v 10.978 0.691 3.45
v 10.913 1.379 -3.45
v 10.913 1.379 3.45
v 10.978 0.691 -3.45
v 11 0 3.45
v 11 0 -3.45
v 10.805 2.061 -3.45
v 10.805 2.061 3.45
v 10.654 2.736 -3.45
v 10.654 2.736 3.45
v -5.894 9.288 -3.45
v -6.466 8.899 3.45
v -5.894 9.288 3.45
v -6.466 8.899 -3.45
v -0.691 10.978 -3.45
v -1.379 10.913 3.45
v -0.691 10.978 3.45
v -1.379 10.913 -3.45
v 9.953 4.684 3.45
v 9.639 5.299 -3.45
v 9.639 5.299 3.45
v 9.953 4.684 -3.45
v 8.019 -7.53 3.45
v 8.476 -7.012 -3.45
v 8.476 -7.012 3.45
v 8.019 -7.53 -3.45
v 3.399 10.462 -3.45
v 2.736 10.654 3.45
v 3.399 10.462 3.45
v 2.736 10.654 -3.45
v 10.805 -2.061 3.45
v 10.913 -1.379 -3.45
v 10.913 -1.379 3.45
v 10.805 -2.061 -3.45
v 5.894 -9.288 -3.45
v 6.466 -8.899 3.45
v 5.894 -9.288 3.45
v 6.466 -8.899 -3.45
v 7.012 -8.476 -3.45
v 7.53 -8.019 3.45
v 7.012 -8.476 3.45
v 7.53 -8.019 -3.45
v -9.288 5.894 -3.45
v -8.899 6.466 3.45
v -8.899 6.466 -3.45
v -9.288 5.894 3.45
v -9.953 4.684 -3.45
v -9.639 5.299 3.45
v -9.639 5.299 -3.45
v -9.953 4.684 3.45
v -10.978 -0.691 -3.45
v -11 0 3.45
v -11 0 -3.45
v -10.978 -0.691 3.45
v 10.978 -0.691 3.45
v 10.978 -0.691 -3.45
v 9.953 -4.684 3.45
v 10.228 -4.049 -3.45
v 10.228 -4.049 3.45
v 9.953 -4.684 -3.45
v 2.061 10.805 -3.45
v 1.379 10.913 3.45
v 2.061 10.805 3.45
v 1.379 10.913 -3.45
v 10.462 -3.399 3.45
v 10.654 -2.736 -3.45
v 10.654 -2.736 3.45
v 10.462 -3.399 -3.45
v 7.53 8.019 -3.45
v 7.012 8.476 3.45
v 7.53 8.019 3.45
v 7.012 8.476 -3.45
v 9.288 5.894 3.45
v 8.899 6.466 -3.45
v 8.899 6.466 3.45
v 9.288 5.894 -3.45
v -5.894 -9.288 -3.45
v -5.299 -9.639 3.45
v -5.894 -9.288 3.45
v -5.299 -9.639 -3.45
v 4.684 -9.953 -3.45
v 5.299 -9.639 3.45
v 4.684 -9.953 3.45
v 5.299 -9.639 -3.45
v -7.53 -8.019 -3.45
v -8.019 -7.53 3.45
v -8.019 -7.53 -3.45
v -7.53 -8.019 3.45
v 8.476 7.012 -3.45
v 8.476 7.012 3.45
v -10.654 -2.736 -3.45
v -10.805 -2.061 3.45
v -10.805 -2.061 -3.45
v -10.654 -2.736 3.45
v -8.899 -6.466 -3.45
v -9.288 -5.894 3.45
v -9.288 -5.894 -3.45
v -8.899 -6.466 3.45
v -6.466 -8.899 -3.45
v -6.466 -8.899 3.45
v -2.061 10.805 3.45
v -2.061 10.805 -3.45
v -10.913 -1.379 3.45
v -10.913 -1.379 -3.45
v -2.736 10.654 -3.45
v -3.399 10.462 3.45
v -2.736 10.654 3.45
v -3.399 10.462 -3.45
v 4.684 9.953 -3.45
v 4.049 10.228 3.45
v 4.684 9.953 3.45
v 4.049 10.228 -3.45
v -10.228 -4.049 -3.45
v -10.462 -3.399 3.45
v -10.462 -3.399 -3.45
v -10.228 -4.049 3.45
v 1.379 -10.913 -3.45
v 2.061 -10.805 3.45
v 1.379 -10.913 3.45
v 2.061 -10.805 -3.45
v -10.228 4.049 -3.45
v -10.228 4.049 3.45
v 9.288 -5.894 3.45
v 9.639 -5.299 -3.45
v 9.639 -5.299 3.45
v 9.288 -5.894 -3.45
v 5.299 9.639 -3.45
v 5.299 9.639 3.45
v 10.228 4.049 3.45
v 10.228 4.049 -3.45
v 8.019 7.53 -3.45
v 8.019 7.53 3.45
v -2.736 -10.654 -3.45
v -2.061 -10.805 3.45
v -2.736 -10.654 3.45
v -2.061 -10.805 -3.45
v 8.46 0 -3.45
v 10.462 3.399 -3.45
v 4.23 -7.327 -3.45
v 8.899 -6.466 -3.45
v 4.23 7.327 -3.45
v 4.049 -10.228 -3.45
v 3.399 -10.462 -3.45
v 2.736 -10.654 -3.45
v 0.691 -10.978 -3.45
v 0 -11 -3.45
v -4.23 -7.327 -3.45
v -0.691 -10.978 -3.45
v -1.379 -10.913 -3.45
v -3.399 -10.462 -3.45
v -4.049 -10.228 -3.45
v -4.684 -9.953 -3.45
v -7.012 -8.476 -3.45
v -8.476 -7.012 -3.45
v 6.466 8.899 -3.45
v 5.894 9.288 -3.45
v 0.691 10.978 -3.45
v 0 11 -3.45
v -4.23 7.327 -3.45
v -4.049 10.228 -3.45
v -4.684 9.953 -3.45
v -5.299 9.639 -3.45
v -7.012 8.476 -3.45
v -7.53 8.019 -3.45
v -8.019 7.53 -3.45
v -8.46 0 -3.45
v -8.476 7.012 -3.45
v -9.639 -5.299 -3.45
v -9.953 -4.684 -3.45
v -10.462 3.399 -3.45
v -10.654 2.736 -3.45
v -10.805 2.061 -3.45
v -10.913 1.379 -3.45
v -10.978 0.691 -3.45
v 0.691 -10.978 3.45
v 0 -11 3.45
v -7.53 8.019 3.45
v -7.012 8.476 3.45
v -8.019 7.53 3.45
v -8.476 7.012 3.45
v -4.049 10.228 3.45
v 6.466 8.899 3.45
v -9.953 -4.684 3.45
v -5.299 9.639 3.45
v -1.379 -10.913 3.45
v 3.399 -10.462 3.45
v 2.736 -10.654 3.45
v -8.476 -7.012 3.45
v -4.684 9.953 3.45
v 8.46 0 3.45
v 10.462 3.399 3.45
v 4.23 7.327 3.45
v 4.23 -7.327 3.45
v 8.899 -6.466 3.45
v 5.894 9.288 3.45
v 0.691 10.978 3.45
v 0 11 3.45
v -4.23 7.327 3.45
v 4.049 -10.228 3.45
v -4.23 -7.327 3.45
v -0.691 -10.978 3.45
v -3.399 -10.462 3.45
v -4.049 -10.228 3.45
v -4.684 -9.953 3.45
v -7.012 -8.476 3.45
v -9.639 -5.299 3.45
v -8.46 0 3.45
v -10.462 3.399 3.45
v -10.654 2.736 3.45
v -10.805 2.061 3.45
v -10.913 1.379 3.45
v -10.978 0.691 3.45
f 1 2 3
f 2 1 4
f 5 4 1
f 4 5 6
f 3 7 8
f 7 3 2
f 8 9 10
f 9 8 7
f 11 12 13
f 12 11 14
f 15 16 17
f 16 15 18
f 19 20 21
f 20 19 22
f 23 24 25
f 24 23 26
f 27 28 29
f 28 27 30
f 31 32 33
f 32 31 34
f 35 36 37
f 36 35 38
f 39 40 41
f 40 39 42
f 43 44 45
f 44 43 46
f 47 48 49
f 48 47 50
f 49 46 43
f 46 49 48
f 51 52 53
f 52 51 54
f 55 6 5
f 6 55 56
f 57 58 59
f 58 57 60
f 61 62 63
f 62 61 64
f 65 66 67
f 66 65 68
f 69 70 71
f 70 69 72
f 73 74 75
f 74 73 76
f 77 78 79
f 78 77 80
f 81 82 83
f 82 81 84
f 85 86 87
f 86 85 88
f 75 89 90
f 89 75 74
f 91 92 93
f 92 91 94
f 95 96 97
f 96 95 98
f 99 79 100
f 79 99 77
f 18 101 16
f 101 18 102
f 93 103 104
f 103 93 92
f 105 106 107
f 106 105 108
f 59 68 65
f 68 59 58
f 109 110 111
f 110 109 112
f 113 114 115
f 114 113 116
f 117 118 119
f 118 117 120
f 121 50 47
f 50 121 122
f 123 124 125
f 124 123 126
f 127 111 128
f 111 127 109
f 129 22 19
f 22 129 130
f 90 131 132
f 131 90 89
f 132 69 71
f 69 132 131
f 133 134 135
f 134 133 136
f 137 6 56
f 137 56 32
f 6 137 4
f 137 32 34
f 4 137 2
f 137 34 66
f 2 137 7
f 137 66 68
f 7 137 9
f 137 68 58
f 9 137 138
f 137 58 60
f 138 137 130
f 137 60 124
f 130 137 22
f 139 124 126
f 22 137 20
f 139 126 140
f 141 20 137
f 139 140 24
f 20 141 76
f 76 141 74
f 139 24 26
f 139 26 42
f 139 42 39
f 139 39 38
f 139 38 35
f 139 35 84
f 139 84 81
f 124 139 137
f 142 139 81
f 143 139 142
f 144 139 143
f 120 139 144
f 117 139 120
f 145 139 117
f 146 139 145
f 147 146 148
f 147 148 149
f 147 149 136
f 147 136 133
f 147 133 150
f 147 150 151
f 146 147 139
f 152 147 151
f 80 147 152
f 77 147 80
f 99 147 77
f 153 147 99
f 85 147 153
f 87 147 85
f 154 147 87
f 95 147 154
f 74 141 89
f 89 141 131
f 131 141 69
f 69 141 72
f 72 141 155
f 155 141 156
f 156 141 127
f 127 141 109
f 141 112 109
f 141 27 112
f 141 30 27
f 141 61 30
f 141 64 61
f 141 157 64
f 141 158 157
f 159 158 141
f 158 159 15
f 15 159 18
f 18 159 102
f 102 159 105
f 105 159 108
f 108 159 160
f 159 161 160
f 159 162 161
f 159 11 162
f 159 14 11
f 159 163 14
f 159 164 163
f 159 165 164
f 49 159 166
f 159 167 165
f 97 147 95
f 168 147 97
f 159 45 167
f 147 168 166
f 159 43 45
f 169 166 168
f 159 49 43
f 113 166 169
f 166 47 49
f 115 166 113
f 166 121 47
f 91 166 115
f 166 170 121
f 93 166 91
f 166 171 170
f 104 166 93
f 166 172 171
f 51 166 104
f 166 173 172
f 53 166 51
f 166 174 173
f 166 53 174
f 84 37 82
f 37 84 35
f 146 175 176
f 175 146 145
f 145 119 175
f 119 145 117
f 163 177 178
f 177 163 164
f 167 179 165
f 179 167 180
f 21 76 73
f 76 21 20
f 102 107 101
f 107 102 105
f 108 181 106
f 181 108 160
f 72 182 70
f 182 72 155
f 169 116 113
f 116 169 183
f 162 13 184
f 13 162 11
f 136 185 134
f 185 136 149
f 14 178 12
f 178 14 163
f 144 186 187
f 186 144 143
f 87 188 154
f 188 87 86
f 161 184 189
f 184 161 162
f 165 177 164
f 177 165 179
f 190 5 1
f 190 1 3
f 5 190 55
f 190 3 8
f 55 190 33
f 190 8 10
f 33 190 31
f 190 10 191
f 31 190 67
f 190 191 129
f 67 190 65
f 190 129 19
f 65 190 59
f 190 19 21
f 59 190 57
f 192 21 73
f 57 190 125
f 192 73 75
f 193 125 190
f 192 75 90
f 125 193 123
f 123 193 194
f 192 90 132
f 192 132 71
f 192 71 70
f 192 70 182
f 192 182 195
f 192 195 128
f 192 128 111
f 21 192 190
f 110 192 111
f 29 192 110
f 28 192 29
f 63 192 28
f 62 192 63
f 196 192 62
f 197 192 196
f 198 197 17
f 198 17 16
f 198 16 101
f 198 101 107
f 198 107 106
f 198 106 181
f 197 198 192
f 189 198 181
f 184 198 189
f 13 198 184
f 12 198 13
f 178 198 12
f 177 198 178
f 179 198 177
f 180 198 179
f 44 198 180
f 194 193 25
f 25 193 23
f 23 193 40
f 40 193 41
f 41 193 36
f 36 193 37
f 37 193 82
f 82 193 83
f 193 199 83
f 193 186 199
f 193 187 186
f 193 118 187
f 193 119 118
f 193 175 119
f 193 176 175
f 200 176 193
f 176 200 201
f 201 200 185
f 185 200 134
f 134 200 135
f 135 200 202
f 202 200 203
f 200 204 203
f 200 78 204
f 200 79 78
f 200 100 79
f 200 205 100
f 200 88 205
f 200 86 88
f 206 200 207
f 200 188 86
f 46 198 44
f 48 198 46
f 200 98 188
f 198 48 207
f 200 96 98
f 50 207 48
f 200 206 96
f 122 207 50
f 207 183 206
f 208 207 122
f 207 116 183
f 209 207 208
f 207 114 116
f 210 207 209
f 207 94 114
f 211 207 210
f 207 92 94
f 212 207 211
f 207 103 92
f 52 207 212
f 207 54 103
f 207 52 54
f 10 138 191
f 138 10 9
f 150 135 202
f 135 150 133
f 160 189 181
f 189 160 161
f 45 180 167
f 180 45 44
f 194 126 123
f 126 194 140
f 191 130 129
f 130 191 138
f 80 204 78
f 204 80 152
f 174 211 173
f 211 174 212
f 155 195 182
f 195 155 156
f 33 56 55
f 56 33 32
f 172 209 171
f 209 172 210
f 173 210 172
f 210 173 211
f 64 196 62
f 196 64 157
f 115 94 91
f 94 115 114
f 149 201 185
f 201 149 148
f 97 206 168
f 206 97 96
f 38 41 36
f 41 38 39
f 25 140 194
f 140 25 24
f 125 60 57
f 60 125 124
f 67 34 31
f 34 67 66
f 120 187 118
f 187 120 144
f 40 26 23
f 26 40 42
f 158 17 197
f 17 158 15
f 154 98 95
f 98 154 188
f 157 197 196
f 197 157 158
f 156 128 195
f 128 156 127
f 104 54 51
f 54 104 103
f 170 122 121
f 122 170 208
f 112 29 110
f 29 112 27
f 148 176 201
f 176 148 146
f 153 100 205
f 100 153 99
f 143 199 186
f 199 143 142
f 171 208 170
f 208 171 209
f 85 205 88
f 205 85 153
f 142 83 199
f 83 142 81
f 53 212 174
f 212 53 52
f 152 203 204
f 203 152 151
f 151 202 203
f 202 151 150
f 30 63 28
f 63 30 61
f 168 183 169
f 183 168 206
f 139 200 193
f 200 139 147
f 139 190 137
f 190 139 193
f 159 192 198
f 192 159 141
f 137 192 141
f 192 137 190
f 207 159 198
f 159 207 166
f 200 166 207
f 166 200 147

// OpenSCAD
//--------------------------------------------------------
// Customizer settings and variable defs

// preview[view:south east, tilt:top diagonal]

/* [Dimensions] */
// Thickness of bearing replacement(mm)
Height = 6.9;
// Replacement is a Bolt or a Ball Bearing Sphere
Bolt_or_Ball = "Bolt";  // [Bolt, Ball]
Bolt_type = "M10";      // [M6,M8,M10,M12,M14,manual]
Manual_width = 12;      // [4:0.5:20]
Manual_sides = 6;       // [4,6,8]
// (mm) 
Ball_diameter = 18;     // [4:0.5:20]
// Fidget Spinner Bearing we are replacing (diameter in mm)
Bearing_diameter = 22;
// Round the corners for aesthetics. (Do this last as it takes a while)
Smooth = "no";         // [yes,no]

/* [Hidden] */
// everything defined below here is not visible to customizer
hole_dia = Bolt_type=="M10"   ? 16.92 
			: Bolt_type=="M8" ? 13.92
			: Bolt_type=="M6" ? 10.92
			: Bolt_type=="M12" ? 18.92
			: Bolt_type=="M14" ? 21.92
			: Manual_width;
split_gap = 2; //mm

//
Delta = 0.1;
cyl_res = 100;
rounding = 2;

//
module pretty_cylinder() {
	if (Smooth=="yes") {
		minkowski() {
			cylinder(d=Bearing_diameter-rounding, h=Height-rounding, center=true, $fn=cyl_res);
			sphere(d=rounding, center=true, $fn=12);
		}
	} else {
		cylinder(d=Bearing_diameter, h=Height, center=true, $fn=cyl_res);
	}
}

module bolt() {
	difference() {
		// bearing
		pretty_cylinder();
		//cylinder(d=Bearing_diameter, h=Height, center=true, $fn=cyl_res);
		// hole
		cylinder(d=hole_dia, h=Height+Delta*2, center=true, $fn=Manual_sides);
		
	}
}

module ball () {
	difference() {
		// bearing
		pretty_cylinder();
		//cylinder(d=Bearing_diameter, h=Height, center=true, $fn=cyl_res);
		// hole
		sphere(d=Ball_diameter, center=true, $fn=100);
		// split
		translate([0,Bearing_diameter/2,0])
		cube(size=[split_gap,Bearing_diameter,Height+Delta*2], center=true);
		
	}
}

if (Bolt_or_Ball == "Bolt")
	bolt();
else
	ball();
